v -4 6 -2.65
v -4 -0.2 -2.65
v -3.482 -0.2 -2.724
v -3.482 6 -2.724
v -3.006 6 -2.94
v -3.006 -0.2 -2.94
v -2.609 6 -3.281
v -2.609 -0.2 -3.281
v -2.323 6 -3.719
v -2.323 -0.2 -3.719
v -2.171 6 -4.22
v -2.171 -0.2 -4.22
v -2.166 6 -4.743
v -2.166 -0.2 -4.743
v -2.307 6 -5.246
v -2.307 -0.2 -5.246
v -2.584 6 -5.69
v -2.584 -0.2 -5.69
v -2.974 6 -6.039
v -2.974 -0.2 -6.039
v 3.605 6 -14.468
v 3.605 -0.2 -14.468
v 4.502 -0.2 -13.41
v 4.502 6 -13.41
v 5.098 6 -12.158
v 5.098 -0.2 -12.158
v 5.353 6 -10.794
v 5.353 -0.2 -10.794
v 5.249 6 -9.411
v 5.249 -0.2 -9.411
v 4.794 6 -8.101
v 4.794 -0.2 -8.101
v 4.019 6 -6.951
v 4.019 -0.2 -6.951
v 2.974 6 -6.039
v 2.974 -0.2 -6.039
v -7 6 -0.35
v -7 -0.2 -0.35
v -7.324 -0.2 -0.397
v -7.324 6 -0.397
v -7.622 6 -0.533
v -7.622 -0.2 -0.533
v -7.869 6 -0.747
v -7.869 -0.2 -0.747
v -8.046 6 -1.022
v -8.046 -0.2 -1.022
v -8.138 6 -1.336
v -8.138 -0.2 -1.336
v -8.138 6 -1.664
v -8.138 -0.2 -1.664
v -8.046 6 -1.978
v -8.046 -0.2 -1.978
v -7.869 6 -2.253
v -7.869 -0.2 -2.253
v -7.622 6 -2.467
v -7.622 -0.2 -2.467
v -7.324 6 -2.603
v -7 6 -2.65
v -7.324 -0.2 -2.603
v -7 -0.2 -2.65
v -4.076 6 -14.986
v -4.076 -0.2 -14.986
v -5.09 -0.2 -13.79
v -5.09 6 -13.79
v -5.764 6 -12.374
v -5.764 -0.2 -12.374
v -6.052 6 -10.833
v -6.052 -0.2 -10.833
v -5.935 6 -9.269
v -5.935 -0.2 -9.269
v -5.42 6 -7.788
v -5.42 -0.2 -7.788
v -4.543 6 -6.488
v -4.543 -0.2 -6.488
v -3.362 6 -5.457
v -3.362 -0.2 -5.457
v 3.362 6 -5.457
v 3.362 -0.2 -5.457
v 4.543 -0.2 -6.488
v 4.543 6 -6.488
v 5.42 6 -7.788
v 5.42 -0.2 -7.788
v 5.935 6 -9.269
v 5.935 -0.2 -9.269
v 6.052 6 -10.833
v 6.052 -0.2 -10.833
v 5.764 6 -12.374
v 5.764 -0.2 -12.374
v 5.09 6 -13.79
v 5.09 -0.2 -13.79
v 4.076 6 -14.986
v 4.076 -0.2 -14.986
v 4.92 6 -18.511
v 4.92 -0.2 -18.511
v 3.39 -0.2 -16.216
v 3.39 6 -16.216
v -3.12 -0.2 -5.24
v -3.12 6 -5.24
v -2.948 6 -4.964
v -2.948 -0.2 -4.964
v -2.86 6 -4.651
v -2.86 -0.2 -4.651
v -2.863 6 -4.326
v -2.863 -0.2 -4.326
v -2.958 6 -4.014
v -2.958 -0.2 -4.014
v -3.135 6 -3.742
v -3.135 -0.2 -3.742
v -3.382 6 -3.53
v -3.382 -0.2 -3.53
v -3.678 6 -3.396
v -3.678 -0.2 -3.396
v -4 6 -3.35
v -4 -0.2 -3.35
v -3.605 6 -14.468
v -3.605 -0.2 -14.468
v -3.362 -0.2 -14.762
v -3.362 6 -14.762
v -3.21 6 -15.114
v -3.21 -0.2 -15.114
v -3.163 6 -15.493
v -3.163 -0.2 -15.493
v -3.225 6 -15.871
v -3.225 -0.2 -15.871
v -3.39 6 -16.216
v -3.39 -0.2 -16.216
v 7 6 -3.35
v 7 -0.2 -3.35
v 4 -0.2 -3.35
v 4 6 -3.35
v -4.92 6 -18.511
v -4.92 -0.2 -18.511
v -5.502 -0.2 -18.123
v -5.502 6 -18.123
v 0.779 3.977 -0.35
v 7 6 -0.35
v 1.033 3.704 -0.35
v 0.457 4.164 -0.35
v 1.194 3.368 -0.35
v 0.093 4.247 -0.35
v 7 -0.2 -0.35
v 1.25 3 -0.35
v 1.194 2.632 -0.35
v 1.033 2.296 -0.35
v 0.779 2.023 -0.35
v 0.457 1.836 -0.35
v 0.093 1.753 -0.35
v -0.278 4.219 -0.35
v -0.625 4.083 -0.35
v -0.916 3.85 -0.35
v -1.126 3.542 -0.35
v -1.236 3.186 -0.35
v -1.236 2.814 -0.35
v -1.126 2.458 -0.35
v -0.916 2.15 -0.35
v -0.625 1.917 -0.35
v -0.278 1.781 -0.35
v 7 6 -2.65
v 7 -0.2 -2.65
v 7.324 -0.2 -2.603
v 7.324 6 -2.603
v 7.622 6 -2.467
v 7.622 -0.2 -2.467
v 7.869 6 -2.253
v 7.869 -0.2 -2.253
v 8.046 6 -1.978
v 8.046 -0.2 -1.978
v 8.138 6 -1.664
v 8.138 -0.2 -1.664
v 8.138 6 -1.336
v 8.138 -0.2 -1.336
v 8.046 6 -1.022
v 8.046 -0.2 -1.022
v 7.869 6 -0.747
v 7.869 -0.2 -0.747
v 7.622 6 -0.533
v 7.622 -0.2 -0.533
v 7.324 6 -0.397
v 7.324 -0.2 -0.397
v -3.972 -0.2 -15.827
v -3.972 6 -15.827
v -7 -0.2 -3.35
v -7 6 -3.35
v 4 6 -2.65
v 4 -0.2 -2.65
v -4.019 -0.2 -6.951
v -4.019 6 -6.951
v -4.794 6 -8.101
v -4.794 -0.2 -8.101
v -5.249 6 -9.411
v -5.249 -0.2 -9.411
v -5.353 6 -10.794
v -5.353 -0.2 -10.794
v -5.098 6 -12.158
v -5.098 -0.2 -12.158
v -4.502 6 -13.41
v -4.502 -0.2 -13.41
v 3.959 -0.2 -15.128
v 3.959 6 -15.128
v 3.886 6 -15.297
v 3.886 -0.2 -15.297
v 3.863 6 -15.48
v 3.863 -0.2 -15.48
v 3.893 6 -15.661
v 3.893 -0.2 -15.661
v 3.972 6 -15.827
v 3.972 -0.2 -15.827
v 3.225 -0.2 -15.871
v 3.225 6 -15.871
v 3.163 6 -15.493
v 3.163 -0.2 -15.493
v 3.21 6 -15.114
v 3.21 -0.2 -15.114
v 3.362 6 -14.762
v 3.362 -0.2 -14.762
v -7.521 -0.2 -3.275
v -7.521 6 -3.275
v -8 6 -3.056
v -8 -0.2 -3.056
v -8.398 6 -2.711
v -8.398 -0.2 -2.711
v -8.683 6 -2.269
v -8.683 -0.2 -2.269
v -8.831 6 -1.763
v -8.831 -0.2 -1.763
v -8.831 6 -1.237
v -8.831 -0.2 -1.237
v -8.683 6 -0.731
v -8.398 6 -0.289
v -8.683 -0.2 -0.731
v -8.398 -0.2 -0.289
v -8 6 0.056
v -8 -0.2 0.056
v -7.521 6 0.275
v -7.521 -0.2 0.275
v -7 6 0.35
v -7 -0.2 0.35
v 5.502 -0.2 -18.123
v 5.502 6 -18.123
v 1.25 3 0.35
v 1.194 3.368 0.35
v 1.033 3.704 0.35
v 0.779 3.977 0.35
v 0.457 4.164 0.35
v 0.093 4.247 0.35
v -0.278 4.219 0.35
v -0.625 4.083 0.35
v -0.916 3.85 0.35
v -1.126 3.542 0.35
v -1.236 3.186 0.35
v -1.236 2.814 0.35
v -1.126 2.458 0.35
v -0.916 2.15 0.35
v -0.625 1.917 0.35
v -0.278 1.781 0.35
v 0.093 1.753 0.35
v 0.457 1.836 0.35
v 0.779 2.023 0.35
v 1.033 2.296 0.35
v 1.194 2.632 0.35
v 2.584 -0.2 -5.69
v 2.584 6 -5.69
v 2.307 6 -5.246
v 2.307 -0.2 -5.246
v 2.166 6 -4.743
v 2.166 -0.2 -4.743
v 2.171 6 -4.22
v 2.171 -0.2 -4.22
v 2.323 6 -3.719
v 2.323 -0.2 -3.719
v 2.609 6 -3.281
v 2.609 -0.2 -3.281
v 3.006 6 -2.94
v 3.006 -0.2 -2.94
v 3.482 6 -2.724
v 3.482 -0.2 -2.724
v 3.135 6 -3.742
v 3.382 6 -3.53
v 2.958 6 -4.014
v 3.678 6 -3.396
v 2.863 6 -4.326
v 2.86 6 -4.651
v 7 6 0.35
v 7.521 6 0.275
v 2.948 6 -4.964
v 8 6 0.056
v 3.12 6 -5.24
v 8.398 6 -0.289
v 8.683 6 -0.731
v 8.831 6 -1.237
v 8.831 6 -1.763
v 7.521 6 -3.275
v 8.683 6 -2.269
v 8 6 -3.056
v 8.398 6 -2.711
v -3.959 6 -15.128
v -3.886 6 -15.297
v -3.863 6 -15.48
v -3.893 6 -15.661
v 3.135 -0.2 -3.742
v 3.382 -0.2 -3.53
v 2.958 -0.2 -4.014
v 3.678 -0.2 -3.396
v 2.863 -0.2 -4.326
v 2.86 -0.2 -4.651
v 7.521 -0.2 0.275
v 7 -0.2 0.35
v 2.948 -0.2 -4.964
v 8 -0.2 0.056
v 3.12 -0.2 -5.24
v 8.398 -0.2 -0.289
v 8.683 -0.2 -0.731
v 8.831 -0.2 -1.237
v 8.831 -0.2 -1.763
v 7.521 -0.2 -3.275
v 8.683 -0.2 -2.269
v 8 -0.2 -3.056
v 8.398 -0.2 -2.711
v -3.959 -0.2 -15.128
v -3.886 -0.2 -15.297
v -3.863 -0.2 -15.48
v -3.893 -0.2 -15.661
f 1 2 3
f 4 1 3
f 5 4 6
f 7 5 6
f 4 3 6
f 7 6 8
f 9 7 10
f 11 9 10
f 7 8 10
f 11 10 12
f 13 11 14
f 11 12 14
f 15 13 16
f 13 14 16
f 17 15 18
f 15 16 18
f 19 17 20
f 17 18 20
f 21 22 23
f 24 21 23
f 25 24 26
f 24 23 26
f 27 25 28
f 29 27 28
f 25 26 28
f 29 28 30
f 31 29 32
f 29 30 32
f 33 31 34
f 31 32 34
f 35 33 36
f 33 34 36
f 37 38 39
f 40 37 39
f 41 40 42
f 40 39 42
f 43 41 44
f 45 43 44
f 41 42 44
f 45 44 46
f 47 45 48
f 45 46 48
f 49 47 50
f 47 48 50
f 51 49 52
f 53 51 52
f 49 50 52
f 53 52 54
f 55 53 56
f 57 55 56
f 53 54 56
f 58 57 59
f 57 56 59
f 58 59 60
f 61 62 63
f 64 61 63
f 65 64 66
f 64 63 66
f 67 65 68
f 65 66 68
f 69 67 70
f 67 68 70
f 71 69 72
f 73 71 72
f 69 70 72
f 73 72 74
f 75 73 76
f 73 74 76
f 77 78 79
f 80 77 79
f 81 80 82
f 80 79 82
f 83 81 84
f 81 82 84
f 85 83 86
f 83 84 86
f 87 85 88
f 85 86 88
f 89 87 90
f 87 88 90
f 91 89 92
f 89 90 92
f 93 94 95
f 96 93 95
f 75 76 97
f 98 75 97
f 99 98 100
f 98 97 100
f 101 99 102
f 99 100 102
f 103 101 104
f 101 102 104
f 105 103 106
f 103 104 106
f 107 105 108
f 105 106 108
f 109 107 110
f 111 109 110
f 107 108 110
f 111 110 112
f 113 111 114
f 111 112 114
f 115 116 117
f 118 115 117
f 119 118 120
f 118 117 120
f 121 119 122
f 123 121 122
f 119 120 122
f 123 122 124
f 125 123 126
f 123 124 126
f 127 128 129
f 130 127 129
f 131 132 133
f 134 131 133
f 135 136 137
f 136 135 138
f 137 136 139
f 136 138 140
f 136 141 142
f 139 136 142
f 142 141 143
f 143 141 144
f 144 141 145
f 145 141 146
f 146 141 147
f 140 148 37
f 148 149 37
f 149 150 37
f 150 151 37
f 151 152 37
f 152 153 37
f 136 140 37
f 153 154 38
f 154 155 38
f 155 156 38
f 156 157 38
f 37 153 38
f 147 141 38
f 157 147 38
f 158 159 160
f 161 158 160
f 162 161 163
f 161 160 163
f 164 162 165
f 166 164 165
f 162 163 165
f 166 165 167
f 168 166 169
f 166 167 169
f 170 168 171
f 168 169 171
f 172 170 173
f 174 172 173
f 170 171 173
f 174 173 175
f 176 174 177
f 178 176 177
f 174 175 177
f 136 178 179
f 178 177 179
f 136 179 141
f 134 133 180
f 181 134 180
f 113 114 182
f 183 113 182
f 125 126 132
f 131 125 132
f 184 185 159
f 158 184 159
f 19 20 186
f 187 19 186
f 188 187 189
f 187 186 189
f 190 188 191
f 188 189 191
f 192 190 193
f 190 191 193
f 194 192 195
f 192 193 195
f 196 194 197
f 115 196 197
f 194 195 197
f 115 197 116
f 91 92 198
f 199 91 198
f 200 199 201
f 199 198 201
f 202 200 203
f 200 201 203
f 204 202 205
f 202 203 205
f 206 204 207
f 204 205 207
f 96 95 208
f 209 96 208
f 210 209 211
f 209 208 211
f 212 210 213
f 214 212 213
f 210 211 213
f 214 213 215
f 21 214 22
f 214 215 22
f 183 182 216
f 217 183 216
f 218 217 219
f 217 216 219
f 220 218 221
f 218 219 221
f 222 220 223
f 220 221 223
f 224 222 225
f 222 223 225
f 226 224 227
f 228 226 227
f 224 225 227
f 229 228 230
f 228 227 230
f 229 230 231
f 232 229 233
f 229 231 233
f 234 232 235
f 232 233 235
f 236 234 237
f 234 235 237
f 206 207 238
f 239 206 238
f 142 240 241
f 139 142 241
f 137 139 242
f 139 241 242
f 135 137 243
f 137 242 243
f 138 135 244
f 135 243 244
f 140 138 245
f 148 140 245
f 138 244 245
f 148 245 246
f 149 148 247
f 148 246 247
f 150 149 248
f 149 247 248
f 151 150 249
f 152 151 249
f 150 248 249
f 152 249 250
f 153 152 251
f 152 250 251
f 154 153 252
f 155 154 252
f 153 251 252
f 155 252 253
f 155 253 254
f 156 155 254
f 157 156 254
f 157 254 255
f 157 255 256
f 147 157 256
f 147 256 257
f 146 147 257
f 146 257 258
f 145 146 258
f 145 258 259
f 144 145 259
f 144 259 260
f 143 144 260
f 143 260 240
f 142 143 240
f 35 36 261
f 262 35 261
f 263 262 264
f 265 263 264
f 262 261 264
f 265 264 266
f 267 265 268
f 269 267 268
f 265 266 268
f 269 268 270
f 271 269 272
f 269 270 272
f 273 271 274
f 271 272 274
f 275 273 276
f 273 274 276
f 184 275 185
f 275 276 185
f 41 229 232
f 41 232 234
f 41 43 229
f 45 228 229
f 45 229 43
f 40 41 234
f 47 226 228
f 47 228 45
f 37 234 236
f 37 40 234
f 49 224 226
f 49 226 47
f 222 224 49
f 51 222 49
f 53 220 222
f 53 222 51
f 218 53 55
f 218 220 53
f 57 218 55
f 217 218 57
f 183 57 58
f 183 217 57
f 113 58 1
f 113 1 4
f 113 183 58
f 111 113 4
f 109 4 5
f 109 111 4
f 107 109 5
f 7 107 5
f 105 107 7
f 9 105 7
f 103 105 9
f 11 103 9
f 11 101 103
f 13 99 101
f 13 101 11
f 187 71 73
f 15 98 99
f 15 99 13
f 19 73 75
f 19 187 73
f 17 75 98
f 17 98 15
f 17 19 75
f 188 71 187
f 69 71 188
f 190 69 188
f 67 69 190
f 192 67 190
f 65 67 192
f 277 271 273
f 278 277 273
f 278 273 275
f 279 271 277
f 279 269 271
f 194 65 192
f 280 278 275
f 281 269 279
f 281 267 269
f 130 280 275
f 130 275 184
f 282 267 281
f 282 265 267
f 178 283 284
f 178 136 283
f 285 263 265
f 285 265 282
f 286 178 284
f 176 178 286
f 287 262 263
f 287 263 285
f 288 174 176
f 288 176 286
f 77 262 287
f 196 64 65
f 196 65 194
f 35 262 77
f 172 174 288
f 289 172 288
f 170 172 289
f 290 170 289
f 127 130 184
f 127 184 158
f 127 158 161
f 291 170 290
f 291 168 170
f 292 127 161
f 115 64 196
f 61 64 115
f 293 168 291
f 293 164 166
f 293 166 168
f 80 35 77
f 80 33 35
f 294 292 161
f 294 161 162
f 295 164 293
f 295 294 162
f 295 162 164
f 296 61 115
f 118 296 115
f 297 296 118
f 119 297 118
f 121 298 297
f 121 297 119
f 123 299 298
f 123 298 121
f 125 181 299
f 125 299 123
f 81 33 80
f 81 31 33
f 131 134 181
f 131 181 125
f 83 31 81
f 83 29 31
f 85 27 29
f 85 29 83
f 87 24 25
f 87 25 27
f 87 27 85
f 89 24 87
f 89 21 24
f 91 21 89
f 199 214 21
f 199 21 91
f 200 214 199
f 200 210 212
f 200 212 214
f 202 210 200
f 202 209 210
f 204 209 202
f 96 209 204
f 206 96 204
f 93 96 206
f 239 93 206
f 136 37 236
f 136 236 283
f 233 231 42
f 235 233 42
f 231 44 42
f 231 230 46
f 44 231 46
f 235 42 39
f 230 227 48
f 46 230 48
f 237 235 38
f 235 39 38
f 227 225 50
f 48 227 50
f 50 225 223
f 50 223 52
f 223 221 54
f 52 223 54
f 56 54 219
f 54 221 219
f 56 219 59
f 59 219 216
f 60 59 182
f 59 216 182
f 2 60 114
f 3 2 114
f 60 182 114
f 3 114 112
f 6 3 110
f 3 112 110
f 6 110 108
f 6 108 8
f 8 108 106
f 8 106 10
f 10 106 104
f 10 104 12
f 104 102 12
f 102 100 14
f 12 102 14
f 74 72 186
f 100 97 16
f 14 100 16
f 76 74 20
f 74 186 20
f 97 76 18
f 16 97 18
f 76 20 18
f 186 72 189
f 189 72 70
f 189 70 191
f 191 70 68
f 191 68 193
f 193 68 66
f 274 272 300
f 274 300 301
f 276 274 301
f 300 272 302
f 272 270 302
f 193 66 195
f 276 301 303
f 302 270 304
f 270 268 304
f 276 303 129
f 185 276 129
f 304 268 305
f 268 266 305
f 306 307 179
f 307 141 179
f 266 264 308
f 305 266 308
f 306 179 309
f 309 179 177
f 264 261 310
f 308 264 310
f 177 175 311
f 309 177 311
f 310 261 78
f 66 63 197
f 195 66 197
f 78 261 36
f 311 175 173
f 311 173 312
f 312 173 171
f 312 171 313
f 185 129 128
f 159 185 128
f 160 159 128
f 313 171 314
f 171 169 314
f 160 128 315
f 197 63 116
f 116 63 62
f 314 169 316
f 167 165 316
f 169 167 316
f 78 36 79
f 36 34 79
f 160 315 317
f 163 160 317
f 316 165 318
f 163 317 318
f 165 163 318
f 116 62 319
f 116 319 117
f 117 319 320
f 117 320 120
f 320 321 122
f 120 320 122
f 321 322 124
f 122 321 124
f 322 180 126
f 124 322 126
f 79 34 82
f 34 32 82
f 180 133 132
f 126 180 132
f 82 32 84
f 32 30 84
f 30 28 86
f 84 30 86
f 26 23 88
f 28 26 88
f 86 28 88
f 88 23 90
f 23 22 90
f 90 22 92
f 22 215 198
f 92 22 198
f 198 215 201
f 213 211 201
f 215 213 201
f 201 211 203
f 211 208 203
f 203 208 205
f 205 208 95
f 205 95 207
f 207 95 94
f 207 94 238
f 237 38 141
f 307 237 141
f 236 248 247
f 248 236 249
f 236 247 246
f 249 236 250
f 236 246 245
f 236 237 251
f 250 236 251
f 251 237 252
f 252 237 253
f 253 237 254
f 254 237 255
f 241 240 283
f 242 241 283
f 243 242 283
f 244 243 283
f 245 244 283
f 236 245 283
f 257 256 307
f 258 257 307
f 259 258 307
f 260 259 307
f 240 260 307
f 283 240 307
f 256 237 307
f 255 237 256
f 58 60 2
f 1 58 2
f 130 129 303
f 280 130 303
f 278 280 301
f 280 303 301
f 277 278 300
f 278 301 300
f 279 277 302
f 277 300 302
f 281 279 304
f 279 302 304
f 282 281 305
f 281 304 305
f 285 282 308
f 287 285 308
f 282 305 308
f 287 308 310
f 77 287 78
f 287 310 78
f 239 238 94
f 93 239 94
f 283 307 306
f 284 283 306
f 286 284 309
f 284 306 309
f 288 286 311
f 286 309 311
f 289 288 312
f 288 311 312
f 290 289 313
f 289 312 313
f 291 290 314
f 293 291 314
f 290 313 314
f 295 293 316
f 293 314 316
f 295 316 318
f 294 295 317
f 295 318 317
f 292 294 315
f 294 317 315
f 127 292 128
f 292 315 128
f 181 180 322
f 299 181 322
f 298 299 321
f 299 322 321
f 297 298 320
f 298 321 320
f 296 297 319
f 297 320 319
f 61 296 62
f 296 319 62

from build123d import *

# Parameters (mm, degrees)
EXTRUDE_THIN3_DEPTH      = 6
EXTRUDE_THIN3_DEPTH_BACK = 0.2
EXTRUDE1_REACH           = 23.681
SKETCH2_R                = 1.25


with BuildPart() as part:
    # Sketch1 → Extrude-Thin3 (new, two sides: drawn at the far end of the back side and taken through both)
    with BuildSketch(Plane(origin=(0, 0, 0), x_dir=(1, 0, 0), z_dir=(0, 1, 0)).offset(-EXTRUDE_THIN3_DEPTH_BACK)):
        with BuildLine():
            Line((-5.502320154, 18.122508758), (-3.972308472, 15.827491235))
            ThreePointArc((-3.972308472, 15.827491235), (-3.86802113, 15.387436777), (-4.076023457, 14.985866351))
            ThreePointArc((-4.076023457, 14.985866351), (-6.044162598, 10.047161593), (-3.362094774, 5.456857838))
            ThreePointArc((-3.362094774, 5.456857838), (-2.89934417, 4.166748229), (-4, 3.35))
            Line((-4, 3.35), (-7, 3.35))
            ThreePointArc((-7, 3.35), (-8.85, 1.5), (-7, -0.35))
            Line((-7, -0.35), (7, -0.35))
            ThreePointArc((7, -0.35), (8.85, 1.5), (7, 3.35))
            Line((7, 3.35), (4, 3.35))
            ThreePointArc((4, 3.35), (2.89934417, 4.166748229), (3.362094774, 5.456857838))
            ThreePointArc((3.362094774, 5.456857838), (6.044162598, 10.047161593), (4.076023457, 14.985866351))
            ThreePointArc((4.076023457, 14.985866351), (3.86802113, 15.387436777), (3.972308472, 15.827491235))
            Line((3.972308472, 15.827491235), (5.502320154, 18.122508758))
            Line((5.502320154, 18.122508758), (4.919884948, 18.510798895))
            Line((4.919884948, 18.510798895), (3.389873266, 16.215781372))
            ThreePointArc((3.389873266, 16.215781372), (3.17327648, 15.301822114), (3.605281311, 14.467791228))
            ThreePointArc((3.605281311, 14.467791228), (5.346119002, 10.099460144), (2.973804637, 6.039293045))
            ThreePointArc((2.973804637, 6.039293045), (2.229379751, 3.963899325), (4, 2.65))
            Line((4, 2.65), (7, 2.65))
            ThreePointArc((7, 2.65), (8.15, 1.5), (7, 0.35))
            Line((7, 0.35), (-7, 0.35))
            ThreePointArc((-7, 0.35), (-8.15, 1.5), (-7, 2.65))
            Line((-7, 2.65), (-4, 2.65))
            ThreePointArc((-4, 2.65), (-2.229379751, 3.963899325), (-2.973804637, 6.039293045))
            ThreePointArc((-2.973804637, 6.039293045), (-5.346119002, 10.099460144), (-3.605281311, 14.467791228))
            ThreePointArc((-3.605281311, 14.467791228), (-3.17327648, 15.301822114), (-3.389873266, 16.215781372))
            Line((-3.389873266, 16.215781372), (-4.919884948, 18.510798895))
            Line((-4.919884948, 18.510798895), (-5.502320154, 18.122508758))
        make_face()
    extrude(amount=EXTRUDE_THIN3_DEPTH + EXTRUDE_THIN3_DEPTH_BACK)

    # Sketch2 → Extrude1 (cut, up to next)
    with BuildSketch(Plane.XY.offset(0.35), mode=Mode.PRIVATE) as extrude1_sk1:
        with Locations((0, 3)):
            Circle(SKETCH2_R)
    extrude1_tool1 = extrude(extrude1_sk1.sketch, amount=-EXTRUDE1_REACH, mode=Mode.PRIVATE) & part.part
    add(extrude1_tool1.solids().sort_by_distance((0, 3, 0.35))[0], mode=Mode.SUBTRACT)


solid = part.part
